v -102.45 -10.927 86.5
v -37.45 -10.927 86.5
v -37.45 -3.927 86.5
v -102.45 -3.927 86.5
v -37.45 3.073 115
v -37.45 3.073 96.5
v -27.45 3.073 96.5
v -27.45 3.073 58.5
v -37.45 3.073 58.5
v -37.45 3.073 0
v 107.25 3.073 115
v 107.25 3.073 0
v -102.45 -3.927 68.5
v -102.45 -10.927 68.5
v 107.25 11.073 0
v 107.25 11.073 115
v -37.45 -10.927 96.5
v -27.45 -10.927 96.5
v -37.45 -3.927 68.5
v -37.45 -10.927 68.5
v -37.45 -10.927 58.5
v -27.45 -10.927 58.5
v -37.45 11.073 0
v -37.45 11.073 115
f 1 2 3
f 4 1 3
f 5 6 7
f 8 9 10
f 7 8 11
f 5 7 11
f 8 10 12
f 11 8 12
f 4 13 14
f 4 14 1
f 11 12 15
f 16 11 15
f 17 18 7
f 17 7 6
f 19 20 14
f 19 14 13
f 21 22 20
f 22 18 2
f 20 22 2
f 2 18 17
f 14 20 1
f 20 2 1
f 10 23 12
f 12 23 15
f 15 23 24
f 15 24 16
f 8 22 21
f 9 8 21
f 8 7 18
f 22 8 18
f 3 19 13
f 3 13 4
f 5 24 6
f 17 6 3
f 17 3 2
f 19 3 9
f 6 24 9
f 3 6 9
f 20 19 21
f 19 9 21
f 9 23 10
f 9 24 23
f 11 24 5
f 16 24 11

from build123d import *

# Parameters (mm, degrees)
SKETCH1_W           = 144.7
SKETCH1_H           = 8
BOSS_EXTRUDE1_DEPTH = 115
SKETCH3_W           = 10
SKETCH3_H           = 18
BOSS_EXTRUDE2_DEPTH = 14
SKETCH4_W           = 18
SKETCH4_H           = 7
BOSS_EXTRUDE6_DEPTH = 65
BOSS_EXTRUDE7_DEPTH = 10
BOSS_EXTRUDE8_DEPTH = 10


with BuildPart() as part:
    # Sketch1 → Boss-Extrude1 (new body)
    with BuildSketch(Plane.XY):
        with Locations((34.899775573, 7.072761635)):
            Rectangle(SKETCH1_W, SKETCH1_H)
    extrude(amount=BOSS_EXTRUDE1_DEPTH)

    # Sketch3 → Boss-Extrude2 (add)
    with BuildSketch(Plane.XZ.offset(-3.072761635)):
        with Locations((-32.450224427, 77.5)):
            Rectangle(SKETCH3_W, SKETCH3_H)
    extrude(amount=BOSS_EXTRUDE2_DEPTH)

    # Sketch4 → Boss-Extrude6 (add)
    with BuildSketch(Plane.ZY.offset(37.450224427)):
        with Locations((77.5, -7.427238365)):
            Rectangle(SKETCH4_W, SKETCH4_H)
    extrude(amount=BOSS_EXTRUDE6_DEPTH)

    # Sketch5 → Boss-Extrude7 (add)
    with BuildSketch(Plane.XY.offset(86.5)):
        Polygon((-37.450224427, 3.072761635), (-27.450224427, 3.072761635), (-27.450224427, -3.927238365), (-27.450224427, -10.927238365), (-37.450224427, -10.927238365), (-37.450224427, -3.927238365), align=None)
    extrude(amount=BOSS_EXTRUDE7_DEPTH)

    # Sketch6 → Boss-Extrude8 (add)
    with BuildSketch(Plane(origin=(0, 0, 68.5), x_dir=(-1, 0, 0), z_dir=(0, 0, -1))):
        Polygon((37.450224427, 3.072761635), (27.450224427, 3.072761635), (27.450224427, -3.927238365), (27.450224427, -10.927238365), (37.450224427, -10.927238365), (37.450224427, -3.927238365), align=None)
    extrude(amount=BOSS_EXTRUDE8_DEPTH)


solid = part.part
